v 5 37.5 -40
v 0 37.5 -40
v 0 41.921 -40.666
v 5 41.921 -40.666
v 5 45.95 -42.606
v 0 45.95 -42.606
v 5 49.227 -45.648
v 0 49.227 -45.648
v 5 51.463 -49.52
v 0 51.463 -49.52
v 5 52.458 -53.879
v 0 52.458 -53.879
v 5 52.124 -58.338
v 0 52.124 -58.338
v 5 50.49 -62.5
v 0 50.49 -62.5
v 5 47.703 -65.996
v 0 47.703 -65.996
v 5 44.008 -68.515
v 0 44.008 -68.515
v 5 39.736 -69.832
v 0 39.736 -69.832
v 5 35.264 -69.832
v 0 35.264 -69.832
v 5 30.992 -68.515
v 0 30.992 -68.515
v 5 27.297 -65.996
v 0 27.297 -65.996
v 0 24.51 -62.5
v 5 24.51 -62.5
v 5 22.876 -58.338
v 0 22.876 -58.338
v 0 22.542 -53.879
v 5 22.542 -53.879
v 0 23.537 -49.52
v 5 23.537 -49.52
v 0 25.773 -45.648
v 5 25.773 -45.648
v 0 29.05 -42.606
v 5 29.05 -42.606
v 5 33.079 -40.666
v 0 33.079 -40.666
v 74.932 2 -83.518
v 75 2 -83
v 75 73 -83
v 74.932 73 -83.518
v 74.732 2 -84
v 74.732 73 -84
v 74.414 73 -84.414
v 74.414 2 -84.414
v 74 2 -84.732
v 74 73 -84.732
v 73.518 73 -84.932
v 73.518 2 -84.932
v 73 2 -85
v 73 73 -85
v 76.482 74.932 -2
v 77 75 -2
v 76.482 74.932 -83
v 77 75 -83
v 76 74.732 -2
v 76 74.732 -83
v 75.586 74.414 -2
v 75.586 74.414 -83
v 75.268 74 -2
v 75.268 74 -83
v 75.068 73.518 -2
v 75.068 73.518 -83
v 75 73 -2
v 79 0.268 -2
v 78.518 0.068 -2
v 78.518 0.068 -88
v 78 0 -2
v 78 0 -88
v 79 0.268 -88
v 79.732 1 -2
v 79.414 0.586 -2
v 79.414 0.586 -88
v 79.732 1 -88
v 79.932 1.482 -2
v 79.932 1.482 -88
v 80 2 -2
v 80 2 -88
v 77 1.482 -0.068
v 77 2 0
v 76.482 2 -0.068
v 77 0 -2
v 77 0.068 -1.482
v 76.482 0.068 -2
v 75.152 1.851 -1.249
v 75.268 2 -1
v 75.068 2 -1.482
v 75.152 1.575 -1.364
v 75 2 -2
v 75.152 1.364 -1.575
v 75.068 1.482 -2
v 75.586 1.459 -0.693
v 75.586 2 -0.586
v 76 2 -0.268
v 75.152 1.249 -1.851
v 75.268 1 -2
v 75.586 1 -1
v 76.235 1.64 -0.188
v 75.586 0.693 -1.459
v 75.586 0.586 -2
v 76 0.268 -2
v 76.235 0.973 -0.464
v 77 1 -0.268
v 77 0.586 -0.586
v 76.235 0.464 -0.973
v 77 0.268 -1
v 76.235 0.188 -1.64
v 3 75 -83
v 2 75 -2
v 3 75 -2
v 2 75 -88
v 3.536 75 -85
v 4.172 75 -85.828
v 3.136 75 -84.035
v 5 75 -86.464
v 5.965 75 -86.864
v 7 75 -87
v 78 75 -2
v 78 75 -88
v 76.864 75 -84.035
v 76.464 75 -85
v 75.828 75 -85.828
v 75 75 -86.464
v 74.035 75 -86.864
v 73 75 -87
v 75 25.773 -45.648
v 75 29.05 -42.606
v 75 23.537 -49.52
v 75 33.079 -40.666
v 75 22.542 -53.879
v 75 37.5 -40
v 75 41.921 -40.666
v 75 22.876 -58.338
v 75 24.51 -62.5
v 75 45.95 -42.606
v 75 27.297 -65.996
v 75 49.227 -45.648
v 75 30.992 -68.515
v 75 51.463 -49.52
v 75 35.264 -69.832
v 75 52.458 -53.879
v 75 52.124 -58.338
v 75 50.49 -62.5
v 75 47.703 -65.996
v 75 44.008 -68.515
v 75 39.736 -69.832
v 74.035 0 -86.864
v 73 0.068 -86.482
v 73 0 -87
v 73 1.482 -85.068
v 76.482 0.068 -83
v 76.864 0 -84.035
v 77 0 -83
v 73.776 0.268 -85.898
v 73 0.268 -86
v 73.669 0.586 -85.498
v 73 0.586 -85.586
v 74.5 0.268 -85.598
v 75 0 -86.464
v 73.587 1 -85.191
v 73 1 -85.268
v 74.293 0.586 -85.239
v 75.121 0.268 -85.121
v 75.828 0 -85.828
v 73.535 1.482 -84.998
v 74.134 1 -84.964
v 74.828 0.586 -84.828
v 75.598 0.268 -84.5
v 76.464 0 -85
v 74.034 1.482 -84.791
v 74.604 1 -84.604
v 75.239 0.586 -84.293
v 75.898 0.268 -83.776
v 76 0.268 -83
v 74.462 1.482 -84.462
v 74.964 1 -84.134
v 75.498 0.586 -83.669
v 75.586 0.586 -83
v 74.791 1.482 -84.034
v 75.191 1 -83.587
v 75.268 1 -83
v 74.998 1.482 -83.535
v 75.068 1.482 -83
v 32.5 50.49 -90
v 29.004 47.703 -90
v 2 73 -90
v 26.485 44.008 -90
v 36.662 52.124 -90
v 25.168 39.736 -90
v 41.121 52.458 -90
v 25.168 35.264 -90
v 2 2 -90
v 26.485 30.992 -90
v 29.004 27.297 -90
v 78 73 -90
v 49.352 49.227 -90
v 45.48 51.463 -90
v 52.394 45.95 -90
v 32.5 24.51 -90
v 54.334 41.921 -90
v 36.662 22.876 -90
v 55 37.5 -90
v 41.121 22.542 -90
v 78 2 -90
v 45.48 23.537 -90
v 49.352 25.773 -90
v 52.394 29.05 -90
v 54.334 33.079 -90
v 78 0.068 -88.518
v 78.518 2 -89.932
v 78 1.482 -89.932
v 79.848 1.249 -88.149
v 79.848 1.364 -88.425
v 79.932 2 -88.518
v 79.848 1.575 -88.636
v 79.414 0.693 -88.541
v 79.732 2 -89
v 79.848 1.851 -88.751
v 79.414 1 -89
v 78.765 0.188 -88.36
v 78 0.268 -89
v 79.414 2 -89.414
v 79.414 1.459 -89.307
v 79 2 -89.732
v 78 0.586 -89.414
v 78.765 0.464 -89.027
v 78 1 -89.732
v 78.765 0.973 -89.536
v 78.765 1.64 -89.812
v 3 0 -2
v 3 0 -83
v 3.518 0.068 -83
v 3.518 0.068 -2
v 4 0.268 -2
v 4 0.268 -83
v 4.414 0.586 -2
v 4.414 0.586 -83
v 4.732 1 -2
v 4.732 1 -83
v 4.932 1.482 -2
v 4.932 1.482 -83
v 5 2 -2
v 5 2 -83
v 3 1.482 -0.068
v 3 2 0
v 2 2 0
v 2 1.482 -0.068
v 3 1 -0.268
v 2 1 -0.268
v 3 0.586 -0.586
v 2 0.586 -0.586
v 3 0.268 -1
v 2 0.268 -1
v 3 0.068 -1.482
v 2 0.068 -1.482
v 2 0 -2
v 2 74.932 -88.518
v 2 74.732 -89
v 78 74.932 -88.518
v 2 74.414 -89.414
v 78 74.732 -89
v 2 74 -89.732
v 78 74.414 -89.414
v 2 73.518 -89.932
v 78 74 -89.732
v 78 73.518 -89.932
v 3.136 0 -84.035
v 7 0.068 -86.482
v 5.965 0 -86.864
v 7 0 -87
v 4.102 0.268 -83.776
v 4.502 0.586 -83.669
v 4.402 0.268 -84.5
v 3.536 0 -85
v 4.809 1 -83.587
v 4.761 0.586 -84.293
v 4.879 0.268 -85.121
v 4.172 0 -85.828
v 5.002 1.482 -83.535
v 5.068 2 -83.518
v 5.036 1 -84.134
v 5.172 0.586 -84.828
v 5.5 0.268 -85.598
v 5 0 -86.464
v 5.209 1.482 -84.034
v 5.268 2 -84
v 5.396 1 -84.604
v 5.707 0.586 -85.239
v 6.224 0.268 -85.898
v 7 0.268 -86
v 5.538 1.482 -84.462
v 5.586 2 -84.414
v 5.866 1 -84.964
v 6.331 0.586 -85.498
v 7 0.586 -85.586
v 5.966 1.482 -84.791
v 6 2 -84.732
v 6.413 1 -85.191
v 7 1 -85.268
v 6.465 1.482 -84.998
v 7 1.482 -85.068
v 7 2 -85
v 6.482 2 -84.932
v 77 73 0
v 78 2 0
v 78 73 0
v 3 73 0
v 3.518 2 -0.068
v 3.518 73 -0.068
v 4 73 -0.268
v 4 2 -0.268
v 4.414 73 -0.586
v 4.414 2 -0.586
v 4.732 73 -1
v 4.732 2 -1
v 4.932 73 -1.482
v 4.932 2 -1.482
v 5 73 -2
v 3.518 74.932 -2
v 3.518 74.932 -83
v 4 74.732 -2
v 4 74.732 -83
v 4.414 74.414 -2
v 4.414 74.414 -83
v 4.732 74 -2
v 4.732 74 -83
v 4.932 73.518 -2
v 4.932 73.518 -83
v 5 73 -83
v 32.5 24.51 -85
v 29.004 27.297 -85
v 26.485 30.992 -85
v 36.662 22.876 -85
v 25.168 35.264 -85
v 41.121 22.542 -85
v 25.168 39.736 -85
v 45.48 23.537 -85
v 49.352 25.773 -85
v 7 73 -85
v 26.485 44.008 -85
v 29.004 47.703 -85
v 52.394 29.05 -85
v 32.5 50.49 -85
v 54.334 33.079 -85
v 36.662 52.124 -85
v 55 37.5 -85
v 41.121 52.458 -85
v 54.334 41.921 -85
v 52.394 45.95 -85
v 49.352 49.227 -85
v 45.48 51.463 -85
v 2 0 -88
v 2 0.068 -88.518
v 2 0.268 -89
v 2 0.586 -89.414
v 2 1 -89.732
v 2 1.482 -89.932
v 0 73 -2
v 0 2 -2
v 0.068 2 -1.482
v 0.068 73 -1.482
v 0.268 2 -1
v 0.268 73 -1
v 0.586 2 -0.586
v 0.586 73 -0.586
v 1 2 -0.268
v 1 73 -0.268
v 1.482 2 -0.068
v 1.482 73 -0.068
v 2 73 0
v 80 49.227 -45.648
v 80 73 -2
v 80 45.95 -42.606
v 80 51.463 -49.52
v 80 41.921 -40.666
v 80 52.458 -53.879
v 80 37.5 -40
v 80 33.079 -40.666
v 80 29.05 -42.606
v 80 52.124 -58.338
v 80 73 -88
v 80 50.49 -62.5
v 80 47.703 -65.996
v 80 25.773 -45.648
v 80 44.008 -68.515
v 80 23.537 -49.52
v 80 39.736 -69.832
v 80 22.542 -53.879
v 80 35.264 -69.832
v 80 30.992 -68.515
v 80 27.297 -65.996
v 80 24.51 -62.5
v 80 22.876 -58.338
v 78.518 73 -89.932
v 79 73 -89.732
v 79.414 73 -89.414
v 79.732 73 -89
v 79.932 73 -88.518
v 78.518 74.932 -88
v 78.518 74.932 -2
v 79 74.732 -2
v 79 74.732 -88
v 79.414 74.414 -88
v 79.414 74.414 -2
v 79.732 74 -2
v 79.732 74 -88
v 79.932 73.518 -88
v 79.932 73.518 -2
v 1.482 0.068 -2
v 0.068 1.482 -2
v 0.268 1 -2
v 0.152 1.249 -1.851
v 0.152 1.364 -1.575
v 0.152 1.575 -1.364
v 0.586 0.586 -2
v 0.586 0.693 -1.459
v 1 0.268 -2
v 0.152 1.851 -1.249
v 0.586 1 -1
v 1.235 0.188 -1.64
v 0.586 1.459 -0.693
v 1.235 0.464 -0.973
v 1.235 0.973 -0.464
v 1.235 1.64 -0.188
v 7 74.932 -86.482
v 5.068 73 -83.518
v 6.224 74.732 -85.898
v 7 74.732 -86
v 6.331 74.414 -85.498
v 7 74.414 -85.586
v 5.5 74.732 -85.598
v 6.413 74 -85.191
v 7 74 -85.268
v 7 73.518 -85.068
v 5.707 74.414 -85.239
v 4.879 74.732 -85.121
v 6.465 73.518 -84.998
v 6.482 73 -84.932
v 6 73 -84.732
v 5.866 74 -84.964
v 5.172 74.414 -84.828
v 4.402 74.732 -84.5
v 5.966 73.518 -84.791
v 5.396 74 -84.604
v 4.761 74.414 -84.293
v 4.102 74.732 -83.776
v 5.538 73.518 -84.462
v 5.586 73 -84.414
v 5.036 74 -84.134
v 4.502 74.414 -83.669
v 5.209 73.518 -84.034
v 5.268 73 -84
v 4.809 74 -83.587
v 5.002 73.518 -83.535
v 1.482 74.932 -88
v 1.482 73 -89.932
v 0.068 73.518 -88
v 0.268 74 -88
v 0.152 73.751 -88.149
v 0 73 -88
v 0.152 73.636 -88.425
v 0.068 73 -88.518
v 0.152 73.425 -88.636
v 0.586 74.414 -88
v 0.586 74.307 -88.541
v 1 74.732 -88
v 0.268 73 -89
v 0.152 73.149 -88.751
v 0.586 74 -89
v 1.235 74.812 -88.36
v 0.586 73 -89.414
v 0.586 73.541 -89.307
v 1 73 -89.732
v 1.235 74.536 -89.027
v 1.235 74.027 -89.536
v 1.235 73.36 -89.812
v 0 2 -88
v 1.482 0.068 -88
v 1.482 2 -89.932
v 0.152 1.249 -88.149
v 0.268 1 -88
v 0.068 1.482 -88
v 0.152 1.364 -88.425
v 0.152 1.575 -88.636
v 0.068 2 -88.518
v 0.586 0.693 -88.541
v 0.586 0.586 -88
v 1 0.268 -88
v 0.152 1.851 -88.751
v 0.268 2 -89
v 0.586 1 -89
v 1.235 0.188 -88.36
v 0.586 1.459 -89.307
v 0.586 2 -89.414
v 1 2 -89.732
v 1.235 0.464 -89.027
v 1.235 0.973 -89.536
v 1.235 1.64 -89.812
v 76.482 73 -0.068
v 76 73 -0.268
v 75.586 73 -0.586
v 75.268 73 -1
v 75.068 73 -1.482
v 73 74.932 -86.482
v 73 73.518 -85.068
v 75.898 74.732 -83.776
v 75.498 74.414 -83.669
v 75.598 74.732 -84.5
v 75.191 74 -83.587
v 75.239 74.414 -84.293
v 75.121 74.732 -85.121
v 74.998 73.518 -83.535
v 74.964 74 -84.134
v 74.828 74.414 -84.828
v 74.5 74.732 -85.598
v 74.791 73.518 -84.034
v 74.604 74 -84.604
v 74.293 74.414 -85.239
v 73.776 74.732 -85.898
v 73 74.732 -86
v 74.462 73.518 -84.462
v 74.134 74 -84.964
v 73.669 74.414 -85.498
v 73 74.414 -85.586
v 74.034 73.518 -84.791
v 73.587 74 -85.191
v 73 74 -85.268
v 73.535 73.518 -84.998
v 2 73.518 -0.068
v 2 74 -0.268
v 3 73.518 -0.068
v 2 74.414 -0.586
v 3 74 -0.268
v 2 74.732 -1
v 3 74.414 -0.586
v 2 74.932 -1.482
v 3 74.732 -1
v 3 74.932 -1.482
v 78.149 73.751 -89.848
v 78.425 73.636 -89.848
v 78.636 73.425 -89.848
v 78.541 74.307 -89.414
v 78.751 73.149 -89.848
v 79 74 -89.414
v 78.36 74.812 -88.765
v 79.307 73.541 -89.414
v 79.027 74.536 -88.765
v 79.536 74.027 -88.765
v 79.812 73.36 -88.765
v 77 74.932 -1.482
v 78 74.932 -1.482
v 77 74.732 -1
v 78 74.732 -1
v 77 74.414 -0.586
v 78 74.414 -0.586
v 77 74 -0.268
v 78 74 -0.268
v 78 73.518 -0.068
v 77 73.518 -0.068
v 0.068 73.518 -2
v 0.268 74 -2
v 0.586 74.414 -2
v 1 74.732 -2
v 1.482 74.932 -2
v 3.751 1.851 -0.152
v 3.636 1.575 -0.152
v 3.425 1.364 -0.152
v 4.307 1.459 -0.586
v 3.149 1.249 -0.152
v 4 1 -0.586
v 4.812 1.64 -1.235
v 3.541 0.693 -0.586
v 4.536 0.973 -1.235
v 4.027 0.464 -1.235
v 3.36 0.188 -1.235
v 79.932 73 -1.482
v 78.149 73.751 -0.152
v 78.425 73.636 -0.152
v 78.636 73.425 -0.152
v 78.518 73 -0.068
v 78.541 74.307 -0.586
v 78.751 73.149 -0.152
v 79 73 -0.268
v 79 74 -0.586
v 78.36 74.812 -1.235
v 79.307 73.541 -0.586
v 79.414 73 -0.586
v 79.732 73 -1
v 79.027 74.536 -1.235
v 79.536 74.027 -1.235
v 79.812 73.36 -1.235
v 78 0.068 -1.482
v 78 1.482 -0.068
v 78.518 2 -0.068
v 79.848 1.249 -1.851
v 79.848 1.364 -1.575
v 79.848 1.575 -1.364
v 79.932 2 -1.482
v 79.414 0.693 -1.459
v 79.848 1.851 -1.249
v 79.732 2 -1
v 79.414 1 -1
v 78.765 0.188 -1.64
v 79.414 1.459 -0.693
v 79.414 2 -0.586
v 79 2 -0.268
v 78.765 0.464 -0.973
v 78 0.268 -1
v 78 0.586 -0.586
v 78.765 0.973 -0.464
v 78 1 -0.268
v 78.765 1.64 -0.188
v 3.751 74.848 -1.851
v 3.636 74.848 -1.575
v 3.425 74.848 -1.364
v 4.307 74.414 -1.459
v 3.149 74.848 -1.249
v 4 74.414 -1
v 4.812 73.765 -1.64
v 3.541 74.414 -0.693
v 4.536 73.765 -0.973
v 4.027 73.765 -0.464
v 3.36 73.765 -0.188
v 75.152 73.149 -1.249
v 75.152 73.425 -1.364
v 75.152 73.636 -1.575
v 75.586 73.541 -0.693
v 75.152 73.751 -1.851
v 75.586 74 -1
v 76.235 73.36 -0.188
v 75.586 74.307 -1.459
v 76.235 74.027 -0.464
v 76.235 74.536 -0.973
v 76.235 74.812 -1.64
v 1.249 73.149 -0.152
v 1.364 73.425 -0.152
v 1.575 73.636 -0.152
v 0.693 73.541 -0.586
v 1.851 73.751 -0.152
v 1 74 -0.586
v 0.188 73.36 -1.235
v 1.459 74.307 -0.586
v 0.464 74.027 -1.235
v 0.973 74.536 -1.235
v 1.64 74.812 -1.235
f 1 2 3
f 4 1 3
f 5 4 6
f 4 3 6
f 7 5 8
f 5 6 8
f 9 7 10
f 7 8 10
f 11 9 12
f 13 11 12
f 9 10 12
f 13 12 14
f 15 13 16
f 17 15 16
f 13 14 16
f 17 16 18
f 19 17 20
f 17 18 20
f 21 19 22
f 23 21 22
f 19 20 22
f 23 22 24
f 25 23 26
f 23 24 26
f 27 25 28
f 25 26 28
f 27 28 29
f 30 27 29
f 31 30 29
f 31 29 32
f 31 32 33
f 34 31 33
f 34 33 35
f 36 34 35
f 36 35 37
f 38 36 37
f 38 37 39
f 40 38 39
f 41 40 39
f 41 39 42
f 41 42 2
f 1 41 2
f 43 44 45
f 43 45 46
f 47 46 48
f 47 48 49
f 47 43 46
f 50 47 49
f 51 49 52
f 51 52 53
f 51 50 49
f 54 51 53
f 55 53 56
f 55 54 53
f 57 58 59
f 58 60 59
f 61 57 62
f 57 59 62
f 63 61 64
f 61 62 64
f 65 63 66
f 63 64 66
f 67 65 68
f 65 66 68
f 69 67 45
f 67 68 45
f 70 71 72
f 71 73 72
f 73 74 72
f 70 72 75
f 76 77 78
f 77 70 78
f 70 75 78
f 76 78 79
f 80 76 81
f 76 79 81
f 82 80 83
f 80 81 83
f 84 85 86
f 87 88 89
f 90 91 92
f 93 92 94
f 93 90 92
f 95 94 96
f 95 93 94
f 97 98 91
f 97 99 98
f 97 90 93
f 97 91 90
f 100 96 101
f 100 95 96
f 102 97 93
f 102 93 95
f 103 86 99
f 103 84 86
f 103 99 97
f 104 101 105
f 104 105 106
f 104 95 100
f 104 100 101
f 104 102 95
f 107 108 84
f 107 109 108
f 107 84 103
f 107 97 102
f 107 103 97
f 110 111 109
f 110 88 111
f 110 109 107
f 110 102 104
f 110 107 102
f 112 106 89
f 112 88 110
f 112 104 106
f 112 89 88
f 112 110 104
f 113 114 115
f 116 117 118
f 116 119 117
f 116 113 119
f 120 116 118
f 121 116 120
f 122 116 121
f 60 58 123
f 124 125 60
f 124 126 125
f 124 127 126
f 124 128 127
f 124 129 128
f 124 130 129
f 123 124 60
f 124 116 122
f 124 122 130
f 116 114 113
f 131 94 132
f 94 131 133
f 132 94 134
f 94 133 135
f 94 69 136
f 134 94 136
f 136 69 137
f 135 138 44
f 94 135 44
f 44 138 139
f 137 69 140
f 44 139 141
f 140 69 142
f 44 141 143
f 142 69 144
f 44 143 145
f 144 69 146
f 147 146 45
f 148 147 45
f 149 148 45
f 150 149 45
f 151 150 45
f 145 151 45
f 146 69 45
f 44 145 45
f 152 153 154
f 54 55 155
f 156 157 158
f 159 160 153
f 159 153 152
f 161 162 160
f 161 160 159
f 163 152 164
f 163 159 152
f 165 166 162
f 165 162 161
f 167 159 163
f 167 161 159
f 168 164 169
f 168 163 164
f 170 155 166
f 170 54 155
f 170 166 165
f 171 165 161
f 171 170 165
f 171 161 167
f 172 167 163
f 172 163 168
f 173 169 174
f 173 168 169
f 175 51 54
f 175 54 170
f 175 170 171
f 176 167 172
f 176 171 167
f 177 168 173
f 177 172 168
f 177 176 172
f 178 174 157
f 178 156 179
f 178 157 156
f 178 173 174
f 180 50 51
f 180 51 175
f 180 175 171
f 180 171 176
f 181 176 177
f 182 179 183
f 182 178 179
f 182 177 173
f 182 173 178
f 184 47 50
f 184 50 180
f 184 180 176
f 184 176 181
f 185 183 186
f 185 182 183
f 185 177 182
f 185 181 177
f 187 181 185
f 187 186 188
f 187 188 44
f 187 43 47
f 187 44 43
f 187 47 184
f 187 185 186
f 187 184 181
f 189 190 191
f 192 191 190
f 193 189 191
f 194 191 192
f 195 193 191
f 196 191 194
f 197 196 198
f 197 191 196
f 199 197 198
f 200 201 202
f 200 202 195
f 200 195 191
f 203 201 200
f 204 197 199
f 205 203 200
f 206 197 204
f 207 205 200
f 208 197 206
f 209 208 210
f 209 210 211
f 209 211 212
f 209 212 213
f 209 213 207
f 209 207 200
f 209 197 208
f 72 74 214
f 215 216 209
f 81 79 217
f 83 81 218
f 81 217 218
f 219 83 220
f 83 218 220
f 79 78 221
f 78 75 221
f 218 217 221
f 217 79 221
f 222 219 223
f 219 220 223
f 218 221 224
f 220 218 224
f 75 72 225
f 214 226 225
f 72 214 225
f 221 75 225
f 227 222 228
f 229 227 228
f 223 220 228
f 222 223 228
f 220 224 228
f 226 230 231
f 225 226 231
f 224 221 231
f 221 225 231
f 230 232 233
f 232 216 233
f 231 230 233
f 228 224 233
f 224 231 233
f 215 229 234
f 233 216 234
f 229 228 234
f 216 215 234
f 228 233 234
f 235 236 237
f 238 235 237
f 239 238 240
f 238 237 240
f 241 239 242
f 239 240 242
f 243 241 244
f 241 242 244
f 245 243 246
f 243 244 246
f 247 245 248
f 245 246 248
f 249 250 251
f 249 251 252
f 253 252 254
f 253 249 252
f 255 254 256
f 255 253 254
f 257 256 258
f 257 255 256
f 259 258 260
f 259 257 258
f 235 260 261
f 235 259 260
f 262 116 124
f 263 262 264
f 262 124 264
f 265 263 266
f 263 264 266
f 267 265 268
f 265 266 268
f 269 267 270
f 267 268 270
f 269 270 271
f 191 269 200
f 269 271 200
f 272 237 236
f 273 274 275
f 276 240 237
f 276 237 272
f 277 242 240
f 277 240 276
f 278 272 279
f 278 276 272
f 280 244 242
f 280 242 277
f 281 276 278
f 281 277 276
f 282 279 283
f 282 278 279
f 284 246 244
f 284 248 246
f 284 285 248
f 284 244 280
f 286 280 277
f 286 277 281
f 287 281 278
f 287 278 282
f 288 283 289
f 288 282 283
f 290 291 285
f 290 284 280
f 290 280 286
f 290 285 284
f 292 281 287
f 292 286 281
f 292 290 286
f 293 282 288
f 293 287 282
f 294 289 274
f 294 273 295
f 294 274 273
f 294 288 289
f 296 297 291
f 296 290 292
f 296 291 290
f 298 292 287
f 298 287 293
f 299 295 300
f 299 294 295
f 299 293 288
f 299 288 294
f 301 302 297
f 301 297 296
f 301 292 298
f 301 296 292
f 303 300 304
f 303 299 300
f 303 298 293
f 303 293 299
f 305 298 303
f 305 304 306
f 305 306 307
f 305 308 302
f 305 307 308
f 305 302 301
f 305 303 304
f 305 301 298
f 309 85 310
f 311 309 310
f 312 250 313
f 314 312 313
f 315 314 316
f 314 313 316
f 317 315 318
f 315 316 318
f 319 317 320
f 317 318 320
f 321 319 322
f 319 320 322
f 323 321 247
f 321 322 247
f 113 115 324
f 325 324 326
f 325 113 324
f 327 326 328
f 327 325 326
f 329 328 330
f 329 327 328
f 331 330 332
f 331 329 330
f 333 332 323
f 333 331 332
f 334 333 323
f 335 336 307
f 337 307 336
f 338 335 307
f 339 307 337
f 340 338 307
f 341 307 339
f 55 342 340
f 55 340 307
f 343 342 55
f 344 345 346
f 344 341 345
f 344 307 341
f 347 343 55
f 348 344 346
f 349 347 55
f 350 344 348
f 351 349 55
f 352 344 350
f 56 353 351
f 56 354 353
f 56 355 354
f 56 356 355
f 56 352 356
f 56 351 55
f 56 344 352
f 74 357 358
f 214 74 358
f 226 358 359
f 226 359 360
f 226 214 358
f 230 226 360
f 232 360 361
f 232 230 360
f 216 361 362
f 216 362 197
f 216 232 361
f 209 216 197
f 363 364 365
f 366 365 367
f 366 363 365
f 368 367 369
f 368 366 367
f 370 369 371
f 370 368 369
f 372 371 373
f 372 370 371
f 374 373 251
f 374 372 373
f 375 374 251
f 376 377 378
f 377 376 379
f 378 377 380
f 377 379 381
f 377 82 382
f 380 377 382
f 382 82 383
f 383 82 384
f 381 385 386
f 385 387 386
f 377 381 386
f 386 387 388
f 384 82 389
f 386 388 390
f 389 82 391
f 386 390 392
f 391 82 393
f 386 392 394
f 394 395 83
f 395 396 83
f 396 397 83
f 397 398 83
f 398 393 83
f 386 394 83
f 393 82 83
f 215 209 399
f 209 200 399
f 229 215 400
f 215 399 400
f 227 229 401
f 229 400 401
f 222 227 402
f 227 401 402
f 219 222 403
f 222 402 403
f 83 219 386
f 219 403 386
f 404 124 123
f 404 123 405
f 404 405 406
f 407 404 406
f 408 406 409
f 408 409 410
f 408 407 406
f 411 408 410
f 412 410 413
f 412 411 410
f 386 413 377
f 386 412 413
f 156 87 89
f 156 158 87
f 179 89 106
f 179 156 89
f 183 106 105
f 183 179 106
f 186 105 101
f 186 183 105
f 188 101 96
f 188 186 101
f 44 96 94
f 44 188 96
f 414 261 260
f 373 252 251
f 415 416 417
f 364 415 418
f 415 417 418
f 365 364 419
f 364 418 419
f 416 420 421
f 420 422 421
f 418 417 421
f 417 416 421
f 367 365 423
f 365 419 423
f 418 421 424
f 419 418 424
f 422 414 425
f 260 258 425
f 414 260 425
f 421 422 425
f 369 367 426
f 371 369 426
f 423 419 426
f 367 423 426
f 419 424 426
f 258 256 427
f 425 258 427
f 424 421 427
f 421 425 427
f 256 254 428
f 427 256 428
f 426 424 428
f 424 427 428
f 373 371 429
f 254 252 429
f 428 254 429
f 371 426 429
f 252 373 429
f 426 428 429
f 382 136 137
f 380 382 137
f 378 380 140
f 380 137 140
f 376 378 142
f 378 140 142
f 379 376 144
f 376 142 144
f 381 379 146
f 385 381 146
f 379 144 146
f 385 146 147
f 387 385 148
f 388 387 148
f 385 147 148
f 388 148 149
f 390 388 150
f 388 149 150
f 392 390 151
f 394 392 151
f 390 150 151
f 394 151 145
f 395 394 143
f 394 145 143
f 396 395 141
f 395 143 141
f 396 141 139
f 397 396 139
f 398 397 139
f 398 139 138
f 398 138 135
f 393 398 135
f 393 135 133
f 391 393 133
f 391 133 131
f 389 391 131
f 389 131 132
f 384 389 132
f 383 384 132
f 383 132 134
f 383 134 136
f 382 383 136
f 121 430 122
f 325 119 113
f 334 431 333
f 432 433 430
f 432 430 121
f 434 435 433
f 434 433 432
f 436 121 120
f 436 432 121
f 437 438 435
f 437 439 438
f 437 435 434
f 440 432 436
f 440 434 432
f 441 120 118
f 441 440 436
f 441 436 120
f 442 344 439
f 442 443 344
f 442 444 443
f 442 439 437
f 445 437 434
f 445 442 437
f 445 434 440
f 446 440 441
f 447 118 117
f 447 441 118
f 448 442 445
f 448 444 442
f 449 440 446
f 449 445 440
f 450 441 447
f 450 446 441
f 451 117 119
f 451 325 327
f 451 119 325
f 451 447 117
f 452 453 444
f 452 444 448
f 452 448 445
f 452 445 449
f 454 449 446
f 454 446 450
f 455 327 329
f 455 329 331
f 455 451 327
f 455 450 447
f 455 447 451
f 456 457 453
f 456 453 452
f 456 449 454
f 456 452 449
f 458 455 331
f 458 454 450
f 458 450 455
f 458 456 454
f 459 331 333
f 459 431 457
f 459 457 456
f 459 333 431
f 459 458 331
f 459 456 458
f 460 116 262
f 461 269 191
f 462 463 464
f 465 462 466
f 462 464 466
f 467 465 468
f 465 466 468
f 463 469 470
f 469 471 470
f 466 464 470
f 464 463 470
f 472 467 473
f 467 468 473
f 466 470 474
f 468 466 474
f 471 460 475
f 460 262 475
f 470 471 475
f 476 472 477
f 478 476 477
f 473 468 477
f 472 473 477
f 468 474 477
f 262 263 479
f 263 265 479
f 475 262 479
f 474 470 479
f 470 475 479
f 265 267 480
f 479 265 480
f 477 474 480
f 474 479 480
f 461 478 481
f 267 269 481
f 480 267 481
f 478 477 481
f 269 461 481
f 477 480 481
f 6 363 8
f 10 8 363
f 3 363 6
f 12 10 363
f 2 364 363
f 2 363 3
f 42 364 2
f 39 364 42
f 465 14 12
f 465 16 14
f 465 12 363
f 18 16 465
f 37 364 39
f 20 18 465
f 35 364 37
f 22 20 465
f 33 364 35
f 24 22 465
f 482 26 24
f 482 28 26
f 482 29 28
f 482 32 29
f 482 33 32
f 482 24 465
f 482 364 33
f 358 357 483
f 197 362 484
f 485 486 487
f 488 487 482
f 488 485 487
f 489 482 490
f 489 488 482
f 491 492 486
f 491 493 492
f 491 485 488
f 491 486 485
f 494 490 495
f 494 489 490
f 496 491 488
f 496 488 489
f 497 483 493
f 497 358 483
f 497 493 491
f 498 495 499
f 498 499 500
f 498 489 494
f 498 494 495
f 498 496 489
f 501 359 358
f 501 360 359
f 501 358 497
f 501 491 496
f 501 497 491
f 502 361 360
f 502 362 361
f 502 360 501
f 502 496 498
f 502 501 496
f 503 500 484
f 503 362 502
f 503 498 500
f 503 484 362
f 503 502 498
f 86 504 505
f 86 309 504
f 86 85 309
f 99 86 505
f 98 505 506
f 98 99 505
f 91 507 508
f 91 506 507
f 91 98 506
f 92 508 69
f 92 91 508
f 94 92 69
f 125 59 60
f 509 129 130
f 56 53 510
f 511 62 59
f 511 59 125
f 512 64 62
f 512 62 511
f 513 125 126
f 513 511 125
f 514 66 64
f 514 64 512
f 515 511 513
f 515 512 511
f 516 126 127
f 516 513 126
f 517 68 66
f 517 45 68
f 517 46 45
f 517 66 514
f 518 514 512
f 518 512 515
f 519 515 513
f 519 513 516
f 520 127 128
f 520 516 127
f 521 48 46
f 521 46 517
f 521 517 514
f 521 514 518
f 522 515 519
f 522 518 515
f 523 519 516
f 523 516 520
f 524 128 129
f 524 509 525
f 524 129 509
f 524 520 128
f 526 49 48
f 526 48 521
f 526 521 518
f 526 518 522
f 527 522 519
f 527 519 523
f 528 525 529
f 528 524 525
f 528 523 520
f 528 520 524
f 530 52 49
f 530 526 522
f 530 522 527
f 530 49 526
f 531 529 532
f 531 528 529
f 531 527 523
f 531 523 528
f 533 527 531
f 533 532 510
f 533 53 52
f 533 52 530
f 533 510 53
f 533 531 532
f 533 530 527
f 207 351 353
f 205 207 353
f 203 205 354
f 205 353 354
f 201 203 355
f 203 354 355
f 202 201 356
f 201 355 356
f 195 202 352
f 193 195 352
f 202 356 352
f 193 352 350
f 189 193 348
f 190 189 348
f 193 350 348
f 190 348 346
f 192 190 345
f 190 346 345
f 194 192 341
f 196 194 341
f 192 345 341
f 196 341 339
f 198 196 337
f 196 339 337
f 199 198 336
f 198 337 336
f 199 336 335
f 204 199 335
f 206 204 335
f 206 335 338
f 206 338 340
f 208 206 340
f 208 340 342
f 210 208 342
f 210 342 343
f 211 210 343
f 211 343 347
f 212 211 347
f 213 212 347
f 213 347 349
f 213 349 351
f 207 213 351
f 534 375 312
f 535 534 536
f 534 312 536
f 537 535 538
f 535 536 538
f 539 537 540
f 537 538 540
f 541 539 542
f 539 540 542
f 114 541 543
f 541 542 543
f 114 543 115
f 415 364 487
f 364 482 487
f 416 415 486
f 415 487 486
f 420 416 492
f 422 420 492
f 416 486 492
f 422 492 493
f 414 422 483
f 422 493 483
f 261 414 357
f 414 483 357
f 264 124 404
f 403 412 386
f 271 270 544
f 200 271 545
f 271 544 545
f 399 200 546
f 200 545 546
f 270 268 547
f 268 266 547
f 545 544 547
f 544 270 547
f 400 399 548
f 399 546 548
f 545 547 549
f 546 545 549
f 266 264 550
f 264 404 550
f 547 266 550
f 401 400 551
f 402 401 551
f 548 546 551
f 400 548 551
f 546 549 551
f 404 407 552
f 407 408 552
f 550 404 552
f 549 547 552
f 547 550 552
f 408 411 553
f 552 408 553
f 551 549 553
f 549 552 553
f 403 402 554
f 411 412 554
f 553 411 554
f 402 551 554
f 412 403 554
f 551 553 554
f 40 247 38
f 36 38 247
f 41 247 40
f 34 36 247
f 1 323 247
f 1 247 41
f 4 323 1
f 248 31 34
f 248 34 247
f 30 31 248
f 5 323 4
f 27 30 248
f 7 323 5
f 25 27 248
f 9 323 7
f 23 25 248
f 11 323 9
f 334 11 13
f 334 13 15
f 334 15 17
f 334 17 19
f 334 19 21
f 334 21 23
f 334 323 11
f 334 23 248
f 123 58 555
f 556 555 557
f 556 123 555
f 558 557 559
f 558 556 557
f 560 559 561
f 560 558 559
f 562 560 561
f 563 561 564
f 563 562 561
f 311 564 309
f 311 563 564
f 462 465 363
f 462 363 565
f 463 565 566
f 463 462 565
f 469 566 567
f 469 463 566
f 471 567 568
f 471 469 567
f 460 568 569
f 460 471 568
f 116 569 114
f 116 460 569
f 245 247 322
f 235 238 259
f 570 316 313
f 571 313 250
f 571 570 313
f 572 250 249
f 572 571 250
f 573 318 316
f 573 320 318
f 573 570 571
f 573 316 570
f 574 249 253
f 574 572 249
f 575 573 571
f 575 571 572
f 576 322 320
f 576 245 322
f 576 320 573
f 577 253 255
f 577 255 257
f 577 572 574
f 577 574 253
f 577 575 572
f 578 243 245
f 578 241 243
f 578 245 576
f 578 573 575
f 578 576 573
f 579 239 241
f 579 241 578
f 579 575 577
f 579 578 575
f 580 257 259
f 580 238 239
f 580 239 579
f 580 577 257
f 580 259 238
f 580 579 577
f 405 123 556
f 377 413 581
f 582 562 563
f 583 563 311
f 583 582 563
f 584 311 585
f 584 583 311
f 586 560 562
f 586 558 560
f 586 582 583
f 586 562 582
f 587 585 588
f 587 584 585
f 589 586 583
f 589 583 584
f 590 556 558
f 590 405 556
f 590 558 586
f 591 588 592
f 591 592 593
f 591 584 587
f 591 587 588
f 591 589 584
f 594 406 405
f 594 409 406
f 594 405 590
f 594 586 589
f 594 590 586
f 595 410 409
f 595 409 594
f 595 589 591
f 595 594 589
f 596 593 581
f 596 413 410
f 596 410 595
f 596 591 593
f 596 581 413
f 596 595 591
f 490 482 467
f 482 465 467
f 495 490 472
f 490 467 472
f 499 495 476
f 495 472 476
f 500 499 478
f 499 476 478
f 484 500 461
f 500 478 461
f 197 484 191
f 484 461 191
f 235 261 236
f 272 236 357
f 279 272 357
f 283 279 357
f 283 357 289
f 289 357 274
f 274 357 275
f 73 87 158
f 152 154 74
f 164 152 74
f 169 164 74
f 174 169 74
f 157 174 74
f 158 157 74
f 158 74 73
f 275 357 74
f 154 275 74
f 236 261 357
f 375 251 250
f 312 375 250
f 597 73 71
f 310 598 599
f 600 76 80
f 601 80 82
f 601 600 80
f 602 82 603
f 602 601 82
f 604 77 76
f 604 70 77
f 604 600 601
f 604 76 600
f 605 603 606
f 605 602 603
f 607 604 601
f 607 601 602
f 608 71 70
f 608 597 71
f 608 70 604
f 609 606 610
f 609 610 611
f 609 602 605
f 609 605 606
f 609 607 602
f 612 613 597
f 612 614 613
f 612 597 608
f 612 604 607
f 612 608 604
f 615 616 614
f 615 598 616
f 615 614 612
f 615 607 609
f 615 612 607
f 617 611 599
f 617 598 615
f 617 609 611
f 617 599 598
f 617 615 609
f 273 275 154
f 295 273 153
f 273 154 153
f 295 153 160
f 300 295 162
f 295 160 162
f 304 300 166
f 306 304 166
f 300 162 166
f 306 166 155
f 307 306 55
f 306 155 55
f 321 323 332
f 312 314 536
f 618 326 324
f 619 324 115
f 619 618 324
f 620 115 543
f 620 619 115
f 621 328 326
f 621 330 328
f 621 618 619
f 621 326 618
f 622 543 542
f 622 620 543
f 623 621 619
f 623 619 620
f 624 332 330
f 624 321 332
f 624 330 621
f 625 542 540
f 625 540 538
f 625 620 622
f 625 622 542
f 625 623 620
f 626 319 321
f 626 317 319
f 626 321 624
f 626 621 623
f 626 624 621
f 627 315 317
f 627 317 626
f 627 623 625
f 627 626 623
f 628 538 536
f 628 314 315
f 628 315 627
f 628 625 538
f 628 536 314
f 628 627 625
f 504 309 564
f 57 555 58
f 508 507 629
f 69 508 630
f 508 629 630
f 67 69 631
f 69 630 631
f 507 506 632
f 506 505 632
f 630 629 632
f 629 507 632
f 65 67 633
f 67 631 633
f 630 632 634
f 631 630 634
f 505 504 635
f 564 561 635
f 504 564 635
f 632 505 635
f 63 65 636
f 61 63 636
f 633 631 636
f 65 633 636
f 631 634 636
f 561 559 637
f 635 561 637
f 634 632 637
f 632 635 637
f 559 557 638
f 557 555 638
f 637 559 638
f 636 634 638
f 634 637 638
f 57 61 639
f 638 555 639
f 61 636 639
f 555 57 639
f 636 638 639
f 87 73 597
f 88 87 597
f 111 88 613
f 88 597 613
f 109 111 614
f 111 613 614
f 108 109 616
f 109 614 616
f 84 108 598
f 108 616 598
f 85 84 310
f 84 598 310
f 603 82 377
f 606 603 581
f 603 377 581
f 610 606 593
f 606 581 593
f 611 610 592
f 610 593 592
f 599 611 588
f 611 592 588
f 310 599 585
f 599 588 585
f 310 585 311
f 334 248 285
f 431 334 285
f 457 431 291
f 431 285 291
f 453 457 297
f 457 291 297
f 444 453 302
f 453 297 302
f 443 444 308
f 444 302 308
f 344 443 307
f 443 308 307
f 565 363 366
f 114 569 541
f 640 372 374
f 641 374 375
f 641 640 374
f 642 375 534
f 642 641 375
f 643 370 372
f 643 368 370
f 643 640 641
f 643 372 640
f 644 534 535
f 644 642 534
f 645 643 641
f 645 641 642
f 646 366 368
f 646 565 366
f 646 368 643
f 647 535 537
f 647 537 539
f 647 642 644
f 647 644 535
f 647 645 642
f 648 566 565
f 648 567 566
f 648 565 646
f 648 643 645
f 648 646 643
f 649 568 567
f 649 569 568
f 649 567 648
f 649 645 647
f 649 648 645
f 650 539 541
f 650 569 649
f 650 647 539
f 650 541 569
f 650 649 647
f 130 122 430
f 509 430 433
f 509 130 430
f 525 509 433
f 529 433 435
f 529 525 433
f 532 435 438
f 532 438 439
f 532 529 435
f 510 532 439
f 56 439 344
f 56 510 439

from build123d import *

# Parameters (mm, degrees)
SKETCH1_W           = 80
SKETCH1_H           = 90
BOSS_EXTRUDE1_DEPTH = 75
SKETCH2_W           = 70
SKETCH2_H           = 85
CUT_EXTRUDE2_DEPTH  = 142.862609591
SKETCH3_R           = 15
CUT_EXTRUDE3_DEPTH  = 142.862609591
SKETCH4_R           = 15
CUT_EXTRUDE4_DEPTH  = 139.744369255
FILLET1_R           = 2


with BuildPart() as part:
    # Sketch1 → Boss-Extrude1 (new body)
    with BuildSketch(Plane(origin=(0, 0, 0), x_dir=(1, 0, 0), z_dir=(0, 1, 0))):
        with Locations((40, 45)):
            Rectangle(SKETCH1_W, SKETCH1_H)
    extrude(amount=BOSS_EXTRUDE1_DEPTH)

    # Sketch2 → Cut-Extrude2 (cut, through all)
    with BuildSketch(Plane(origin=(0, 75, 0), x_dir=(1, 0, 0), z_dir=(0, 1, 0))):
        with Locations((40, 42.5)):
            Rectangle(SKETCH2_W, SKETCH2_H)
    extrude(amount=-CUT_EXTRUDE2_DEPTH, mode=Mode.SUBTRACT)

    # Sketch3 → Cut-Extrude3 (cut, through all)
    with BuildSketch(Plane.ZY):
        with Locations((-55, 37.5)):
            Circle(SKETCH3_R)
    extrude(amount=-CUT_EXTRUDE3_DEPTH, mode=Mode.SUBTRACT)

    # Sketch4 → Cut-Extrude4 (cut, through all)
    with BuildSketch(Plane.XY.offset(-85)):
        with Locations((40, 37.5)):
            Circle(SKETCH4_R)
    extrude(amount=-CUT_EXTRUDE4_DEPTH, mode=Mode.SUBTRACT)

    # Fillet1
    fillet1_edges = [part.edges().sort_by_distance(p)[0] for p in [
        (80, 75, -45),
        (77.5, 0, 0),
        (40, 75, -90),
        (77.5, 75, 0),
        (75, 37.5, 0),
        (5, 0, -42.5),
        (5, 37.5, 0),
        (40, 0, -85),
        (5, 37.5, -85),
        (75, 0, -42.5),
        (75, 37.5, -85),
        (75, 75, -42.5),
        (40, 75, -85),
        (5, 75, -42.5),
        (0, 75, -45),
        (40, 0, -90),
        (80, 0, -45),
        (2.5, 0, 0),
        (0, 0, -45),
        (0, 37.5, -90),
        (80, 37.5, -90),
        (80, 37.5, 0),
        (0, 37.5, 0),
        (2.5, 75, 0),
    ]]
    fillet(fillet1_edges, radius=FILLET1_R)


solid = part.part
